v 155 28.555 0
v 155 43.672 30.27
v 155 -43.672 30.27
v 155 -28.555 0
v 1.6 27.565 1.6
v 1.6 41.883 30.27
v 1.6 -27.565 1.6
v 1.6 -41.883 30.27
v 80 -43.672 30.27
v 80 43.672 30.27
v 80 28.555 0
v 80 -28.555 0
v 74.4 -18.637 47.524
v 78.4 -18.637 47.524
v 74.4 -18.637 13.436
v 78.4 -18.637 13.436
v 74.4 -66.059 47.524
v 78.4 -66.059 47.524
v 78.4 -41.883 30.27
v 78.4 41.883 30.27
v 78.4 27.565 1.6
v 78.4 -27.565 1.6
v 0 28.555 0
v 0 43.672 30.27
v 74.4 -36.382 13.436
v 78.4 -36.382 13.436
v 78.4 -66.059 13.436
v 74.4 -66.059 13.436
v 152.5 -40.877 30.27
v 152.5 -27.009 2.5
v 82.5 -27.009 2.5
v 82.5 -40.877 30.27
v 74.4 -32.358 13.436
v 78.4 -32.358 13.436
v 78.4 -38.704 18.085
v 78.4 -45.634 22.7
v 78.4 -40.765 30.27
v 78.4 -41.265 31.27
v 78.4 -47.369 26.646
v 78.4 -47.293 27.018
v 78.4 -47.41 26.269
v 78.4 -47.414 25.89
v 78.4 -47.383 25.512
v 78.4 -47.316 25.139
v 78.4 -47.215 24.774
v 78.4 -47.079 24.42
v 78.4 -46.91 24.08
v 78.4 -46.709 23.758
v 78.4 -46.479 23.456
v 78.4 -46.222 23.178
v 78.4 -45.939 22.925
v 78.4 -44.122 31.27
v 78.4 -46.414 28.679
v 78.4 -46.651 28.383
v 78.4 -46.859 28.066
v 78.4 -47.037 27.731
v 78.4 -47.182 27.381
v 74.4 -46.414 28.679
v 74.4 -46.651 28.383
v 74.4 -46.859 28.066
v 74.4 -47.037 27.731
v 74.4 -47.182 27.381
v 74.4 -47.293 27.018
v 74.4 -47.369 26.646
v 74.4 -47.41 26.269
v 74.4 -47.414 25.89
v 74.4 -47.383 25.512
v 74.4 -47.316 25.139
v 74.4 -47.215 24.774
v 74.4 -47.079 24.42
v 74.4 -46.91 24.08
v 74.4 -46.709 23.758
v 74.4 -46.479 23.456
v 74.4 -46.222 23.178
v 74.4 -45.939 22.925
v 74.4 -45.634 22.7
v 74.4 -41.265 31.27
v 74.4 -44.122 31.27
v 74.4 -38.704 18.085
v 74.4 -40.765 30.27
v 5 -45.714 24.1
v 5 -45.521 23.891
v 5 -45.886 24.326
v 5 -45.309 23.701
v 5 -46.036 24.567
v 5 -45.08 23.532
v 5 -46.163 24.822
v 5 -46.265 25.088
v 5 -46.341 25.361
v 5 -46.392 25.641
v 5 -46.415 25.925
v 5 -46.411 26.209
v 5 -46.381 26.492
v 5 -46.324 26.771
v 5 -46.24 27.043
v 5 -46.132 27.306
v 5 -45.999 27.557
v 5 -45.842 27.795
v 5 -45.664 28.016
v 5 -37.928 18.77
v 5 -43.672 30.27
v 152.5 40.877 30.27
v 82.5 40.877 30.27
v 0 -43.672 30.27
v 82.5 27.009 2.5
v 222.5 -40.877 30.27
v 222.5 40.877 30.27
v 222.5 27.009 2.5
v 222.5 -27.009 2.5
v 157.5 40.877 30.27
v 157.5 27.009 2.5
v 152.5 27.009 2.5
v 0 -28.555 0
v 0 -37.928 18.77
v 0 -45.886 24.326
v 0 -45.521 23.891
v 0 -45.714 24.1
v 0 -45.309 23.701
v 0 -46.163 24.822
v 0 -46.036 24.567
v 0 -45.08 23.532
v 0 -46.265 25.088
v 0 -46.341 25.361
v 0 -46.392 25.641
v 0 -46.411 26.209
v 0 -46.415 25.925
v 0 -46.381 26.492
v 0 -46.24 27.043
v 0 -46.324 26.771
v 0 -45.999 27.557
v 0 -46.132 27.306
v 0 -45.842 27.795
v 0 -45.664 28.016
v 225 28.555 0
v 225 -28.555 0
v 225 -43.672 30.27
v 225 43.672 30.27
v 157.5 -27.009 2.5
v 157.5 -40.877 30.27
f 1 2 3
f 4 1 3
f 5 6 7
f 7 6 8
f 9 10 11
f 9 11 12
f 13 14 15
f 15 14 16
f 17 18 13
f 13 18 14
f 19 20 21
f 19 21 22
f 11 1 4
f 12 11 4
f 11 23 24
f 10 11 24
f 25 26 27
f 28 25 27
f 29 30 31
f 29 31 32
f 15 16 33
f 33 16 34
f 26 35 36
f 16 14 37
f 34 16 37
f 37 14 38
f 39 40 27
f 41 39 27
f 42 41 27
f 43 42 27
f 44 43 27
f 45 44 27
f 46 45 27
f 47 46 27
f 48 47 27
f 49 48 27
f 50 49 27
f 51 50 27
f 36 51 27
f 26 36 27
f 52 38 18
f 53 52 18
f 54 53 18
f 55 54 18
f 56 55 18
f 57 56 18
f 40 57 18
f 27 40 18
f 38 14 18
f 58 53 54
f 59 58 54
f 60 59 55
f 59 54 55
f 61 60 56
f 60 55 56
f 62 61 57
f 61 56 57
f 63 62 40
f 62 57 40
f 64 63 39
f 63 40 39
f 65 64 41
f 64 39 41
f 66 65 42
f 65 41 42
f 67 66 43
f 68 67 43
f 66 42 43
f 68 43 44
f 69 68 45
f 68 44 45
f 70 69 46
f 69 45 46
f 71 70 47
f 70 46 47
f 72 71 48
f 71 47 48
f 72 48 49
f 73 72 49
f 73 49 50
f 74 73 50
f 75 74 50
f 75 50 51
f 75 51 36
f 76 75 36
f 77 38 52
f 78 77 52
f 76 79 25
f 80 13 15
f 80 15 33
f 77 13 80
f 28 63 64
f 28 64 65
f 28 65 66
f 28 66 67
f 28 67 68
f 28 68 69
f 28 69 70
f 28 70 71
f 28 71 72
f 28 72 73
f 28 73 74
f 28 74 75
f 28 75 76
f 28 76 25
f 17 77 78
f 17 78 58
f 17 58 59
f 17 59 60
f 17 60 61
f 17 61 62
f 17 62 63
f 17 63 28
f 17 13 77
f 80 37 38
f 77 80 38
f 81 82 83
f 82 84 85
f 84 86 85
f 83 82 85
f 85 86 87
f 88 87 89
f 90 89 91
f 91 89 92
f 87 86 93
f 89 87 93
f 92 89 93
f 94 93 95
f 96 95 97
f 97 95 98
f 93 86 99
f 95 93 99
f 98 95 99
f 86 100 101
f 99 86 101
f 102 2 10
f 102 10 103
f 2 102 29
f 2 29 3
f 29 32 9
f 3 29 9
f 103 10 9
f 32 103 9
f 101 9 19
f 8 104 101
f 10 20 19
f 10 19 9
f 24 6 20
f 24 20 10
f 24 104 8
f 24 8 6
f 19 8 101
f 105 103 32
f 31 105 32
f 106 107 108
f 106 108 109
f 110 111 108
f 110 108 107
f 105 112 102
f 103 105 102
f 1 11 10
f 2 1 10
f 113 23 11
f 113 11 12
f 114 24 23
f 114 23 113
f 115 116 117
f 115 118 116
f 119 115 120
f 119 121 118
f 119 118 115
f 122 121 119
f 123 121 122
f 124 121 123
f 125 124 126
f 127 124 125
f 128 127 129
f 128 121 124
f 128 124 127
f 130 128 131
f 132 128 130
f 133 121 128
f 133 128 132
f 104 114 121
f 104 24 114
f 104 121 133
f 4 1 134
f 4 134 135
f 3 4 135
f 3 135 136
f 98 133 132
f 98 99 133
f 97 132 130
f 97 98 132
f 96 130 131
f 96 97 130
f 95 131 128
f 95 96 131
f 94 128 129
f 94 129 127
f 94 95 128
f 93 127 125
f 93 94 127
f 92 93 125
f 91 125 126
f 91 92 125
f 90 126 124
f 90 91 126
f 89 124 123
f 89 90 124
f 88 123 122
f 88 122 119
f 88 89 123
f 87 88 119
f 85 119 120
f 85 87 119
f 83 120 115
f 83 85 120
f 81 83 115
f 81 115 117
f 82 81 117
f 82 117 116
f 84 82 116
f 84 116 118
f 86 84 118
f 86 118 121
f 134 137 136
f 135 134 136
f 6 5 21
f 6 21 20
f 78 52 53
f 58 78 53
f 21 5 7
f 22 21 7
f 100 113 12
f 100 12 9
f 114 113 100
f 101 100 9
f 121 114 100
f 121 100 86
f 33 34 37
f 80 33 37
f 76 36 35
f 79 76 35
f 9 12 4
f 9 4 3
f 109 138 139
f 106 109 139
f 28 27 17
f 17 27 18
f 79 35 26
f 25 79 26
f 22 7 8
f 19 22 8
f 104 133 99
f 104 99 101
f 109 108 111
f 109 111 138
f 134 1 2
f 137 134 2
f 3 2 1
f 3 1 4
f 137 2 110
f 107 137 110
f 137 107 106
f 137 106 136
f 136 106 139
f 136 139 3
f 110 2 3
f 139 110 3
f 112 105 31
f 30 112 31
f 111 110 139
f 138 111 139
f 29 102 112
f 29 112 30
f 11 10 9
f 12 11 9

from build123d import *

# Parameters (mm, degrees)
F1_DEPTH  = 80
F3_T      = -1.6
F4_DEPTH  = 75
F5_DEPTH  = 70
F6_T      = -2.5
F7_T      = -2.5
F9_DEPTH  = 5
F10_R     = 3
F12_DEPTH = 4


with BuildPart() as f1:
    # F0 (on Right) → F1 (new body)
    with BuildSketch(Plane.YZ):
        Polygon((0, 30.2703026682), (0, 0), (28.5545513034, 0), (43.6716713011, 30.2703026682), align=None)
    extrude(amount=F1_DEPTH)

    # F2: F1 across face


with BuildPart() as f1_1:
    add(f1.part)
    add(f1.part.mirror(Plane(origin=(40, 0, 15.1351513341), x_dir=(1, 0, 0), z_dir=(0, -1, 0))))

    # F3
    f3_openings = [f1_1.faces().sort_by_distance(p)[0] for p in [
        (40, 0, 30.270303),
    ]]
    offset(amount=F3_T, openings=f3_openings)


with BuildPart() as f4:
    # F4 (new): a face of the model
    f4_faces = [f1_1.part.faces().sort_by_distance(p)[0] for p in [
        (80, 0, 16.191092379),
    ]]
    extrude(f4_faces, amount=F4_DEPTH)


with BuildPart() as f5:
    # F5 (new): a face of the model
    f5_faces = [f4.part.faces().sort_by_distance(p)[0] for p in [
        (155, 0, 16.191092379),
    ]]
    extrude(f5_faces, amount=F5_DEPTH)

    # F7
    f7_openings = [f5.faces().sort_by_distance(p)[0] for p in [
        (190, 0, 30.270303),
    ]]
    offset(amount=F7_T, openings=f7_openings)


with BuildPart() as f4_1:
    add(f4.part)

    # F6
    f6_openings = [f4_1.faces().sort_by_distance(p)[0] for p in [
        (117.5, 0, 30.270303),
    ]]
    offset(amount=F6_T, openings=f6_openings)


with BuildPart() as f1_2:
    add(f1_1.part)

    # F8 (on face) → F9 (join)
    with BuildSketch(Plane(origin=(0, 0, 0), x_dir=(0, -1, 0), z_dir=(-1, 0, 0))):
        Polygon((47.9428991675, 25.4391934723), (43.6716713011, 30.2703026682), (37.9283721854, 18.7700034993), align=None)
    extrude(amount=-F9_DEPTH)

    # F10
    f10_edges = [f1_2.edges().sort_by_distance(p)[0] for p in [
        (2.5, -47.942899, 25.439193),
    ]]
    fillet(f10_edges, radius=F10_R)


with BuildPart() as f12:
    # F11 (on face) → F12 (new body)
    with BuildSketch(Plane(origin=(78.4, 0, 0), x_dir=(0, -1, 0), z_dir=(-1, 0, 0))):
        with BuildLine():
            Line((18.6374253944, 30.2703026682), (40.7654752274, 30.2703026682))
            Line((40.7654752274, 30.2703026682), (41.2648795499, 31.2703026682))
            Line((41.2648795499, 31.2703026682), (44.1223463978, 31.2703026682))
            Line((44.1223463978, 31.2703026682), (46.4135051114, 28.6788141602))
            ThreePointArc((46.4135051114, 28.6788141602), (47.3831889957, 25.5121757921), (45.633918416, 22.7000702056))
            Line((45.633918416, 22.7000702056), (38.7041291926, 18.0851661881))
            Line((38.7041291926, 18.0851661881), (36.3821730553, 13.4357147668))
            Line((36.3821730553, 13.4357147668), (66.0590111629, 13.4357147668))
            Line((66.0590111629, 13.4357147668), (66.0590111629, 47.5241559376))
            Line((66.0590111629, 47.5241559376), (18.6374253944, 47.5241559376))
            Line((18.6374253944, 47.5241559376), (18.6374253944, 30.2703026682))
        make_face()
        Polygon((32.3582092609, 13.4357147668), (40.7654752274, 30.2703026682), (18.6374253944, 30.2703026682), (18.6374253944, 13.4357147668), align=None)
    extrude(amount=F12_DEPTH)


solid = Compound([f5.part, f4_1.part, f1_2.part, f12.part])
